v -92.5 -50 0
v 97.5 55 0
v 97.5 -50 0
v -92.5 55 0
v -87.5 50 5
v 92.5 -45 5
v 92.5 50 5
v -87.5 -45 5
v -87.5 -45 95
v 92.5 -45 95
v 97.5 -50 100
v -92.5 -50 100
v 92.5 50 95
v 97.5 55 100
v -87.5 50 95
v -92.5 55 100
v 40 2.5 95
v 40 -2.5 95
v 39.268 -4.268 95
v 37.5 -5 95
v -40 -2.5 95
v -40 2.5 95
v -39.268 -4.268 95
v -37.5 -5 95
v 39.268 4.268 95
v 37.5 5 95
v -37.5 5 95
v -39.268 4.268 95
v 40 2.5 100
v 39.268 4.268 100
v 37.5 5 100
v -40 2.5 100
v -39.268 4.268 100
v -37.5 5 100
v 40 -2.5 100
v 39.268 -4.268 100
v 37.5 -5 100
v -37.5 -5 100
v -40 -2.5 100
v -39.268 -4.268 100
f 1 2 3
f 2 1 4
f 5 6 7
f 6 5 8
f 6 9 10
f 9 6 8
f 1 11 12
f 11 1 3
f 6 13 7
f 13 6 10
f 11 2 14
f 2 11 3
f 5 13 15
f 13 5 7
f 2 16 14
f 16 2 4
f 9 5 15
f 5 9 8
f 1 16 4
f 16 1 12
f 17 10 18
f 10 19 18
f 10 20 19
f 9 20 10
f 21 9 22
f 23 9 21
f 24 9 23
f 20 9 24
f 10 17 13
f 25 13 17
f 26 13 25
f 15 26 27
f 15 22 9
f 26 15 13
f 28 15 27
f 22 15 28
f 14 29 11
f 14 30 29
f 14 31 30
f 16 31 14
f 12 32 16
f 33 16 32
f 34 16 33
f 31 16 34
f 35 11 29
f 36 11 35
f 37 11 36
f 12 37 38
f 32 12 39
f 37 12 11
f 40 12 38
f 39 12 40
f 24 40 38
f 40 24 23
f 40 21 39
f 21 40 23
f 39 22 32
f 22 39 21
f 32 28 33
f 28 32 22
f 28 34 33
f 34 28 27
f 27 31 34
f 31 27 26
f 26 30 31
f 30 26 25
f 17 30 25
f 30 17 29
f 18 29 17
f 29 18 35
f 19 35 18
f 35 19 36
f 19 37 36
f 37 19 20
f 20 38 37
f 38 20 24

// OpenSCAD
Hauteur                         = 100;
Largeur                         = 185;
Profondeur                      = 100;
EpaisseurPlanches               = 5;

NombreSubdivisionsHauteur       = 5;
NombreSubdivisionsLargeur       = 2;
NombreSubdivisionsProfondeur    = 2;

BoiteFermee                     = "oui";//[oui,non]


Fente                           = "oui";//[oui,non]
HauteurFente                    = 10;
LargeurFente                    = 80;
ArrondiCoins                    = 5;

modevision                      = "boite";//[boite,DXF]

SubH = Hauteur/((2*NombreSubdivisionsHauteur)+1);
SubL = (Largeur)/((2*NombreSubdivisionsLargeur)+1);
SubP = Profondeur/((2*NombreSubdivisionsProfondeur)+1);
SubP2 = (Profondeur-EpaisseurPlanches)/((2*NombreSubdivisionsProfondeur)+1);


objet();

module objet()
{
if(modevision=="boite")
{
    boite();
}
if(modevision=="DXF")
{
    DXFF();
}
}
module DXFF()
{
translate([-Largeur/2-EpaisseurPlanches,-Hauteur/2-EpaisseurPlanches])cotesun();
translate([Profondeur/2+EpaisseurPlanches,-Hauteur/2-EpaisseurPlanches])cotesdeux();   
translate([-Largeur/2-EpaisseurPlanches,Hauteur/2+EpaisseurPlanches])cotesun();
translate([Profondeur/2+EpaisseurPlanches,Hauteur/2+EpaisseurPlanches])cotesdeux();
translate([EpaisseurPlanches+Largeur/2,Hauteur+Profondeur/2+EpaisseurPlanches*2]) dessous();
if(BoiteFermee=="oui")
{
translate([-Largeur/2-EpaisseurPlanches,Hauteur+Profondeur/2+EpaisseurPlanches*2]) dessus();  
}
}

module boite()
{
color("red")
linear_extrude(height=EpaisseurPlanches)
dessous();
if(BoiteFermee=="oui")
{
color([1,0,0,1])
translate([0,0,Hauteur-EpaisseurPlanches])
linear_extrude(height=EpaisseurPlanches)
dessus();
}


color("green")
rotate([90,0,0])
translate([0,Hauteur/2,Profondeur/2])
rotate([180,0,0])
linear_extrude(height=EpaisseurPlanches)
cotesun();

color("green")
rotate([90,0,0])
translate([EpaisseurPlanches,Hauteur/2,-Profondeur/2-EpaisseurPlanches])
rotate([0,0,180])
linear_extrude(height=EpaisseurPlanches)
cotesun();

color("blue")
rotate([90,0,90])
translate([0,Hauteur/2,Largeur/2])
linear_extrude(height=EpaisseurPlanches)
cotesdeux();

color("blue")
rotate([90,0,-90])
translate([-EpaisseurPlanches,Hauteur/2,Largeur/2-EpaisseurPlanches])
linear_extrude(height=EpaisseurPlanches)
cotesdeux();
}

module cotesun()
{
    difference()
    {
        union()
        {
            square([Largeur,Hauteur],center=true);
            for(i=[-NombreSubdivisionsHauteur:2:NombreSubdivisionsHauteur])
            {
                translate([Largeur/2,SubH*i,0])
                square([EpaisseurPlanches*2,SubH],center=true);
            }
        }
        for(i=[-NombreSubdivisionsHauteur:2:NombreSubdivisionsHauteur])
        {
            translate([-Largeur/2,SubH*i,0])
            square([EpaisseurPlanches*2,SubH],center=true);
        }
        
        for(i=[-NombreSubdivisionsLargeur+1:2:NombreSubdivisionsLargeur-1])
        {
            translate([EpaisseurPlanches/2,0])
            translate([(((Largeur-1*EpaisseurPlanches)/((2*NombreSubdivisionsLargeur)+1))*i),Hauteur/2])
            square([(Largeur-1*EpaisseurPlanches)/((2*NombreSubdivisionsLargeur)+1),EpaisseurPlanches*2],center=true);
        }
if(BoiteFermee=="oui")
    
        for(i=[-NombreSubdivisionsLargeur+1:2:NombreSubdivisionsLargeur-1])
        {
            translate([EpaisseurPlanches/2,0])
            translate([(((Largeur-1*EpaisseurPlanches)/((2*NombreSubdivisionsLargeur)+1))*i),-Hauteur/2])
            square([(Largeur-1*EpaisseurPlanches)/((2*NombreSubdivisionsLargeur)+1),EpaisseurPlanches*2],center=true);
        }

    }
}






module cotesdeux()
{
difference()
    {
    union()
    {
        square([Profondeur,Hauteur],center=true);
        for(i=[-NombreSubdivisionsHauteur:2:NombreSubdivisionsHauteur])
        {
            translate([Profondeur/2,SubH*i,0])
            square([EpaisseurPlanches*2,SubH],center=true);
        }
 
    }
    for(i=[-NombreSubdivisionsHauteur:2:NombreSubdivisionsHauteur])
    {
        translate([-Profondeur/2,SubH*i,0])
        square([EpaisseurPlanches*2,SubH],center=true);
    }
    for(i=[-NombreSubdivisionsProfondeur+1:2:NombreSubdivisionsProfondeur-1])
    {
        translate([EpaisseurPlanches/2,0])
        translate([(((Profondeur-1*EpaisseurPlanches)/((2*NombreSubdivisionsProfondeur)+1))*i),-Hauteur/2])
        square([(Profondeur-1*EpaisseurPlanches)/((2*NombreSubdivisionsProfondeur)+1),EpaisseurPlanches*2],center=true);
    }
    if(BoiteFermee=="oui")
    {
    for(i=[-NombreSubdivisionsProfondeur+1:2:NombreSubdivisionsProfondeur-1])
    {
        translate([EpaisseurPlanches/2,0])
        translate([(((Profondeur-1*EpaisseurPlanches)/((2*NombreSubdivisionsProfondeur)+1))*i),Hauteur/2])
        square([(Profondeur-1*EpaisseurPlanches)/((2*NombreSubdivisionsProfondeur)+1),EpaisseurPlanches*2],center=true);
    }
}
    
    }
}







module dessous()
{
    tailleX=Largeur-(EpaisseurPlanches);
    tailleY=Profondeur-(EpaisseurPlanches);
    union()
    {
        translate([EpaisseurPlanches/2,EpaisseurPlanches/2])
        square([tailleX,tailleY],center=true);
        for(i=[-NombreSubdivisionsLargeur+1:2:NombreSubdivisionsLargeur-1])
        {
            translate([EpaisseurPlanches/2,0])
            translate([(((Largeur-1*EpaisseurPlanches)/((2*NombreSubdivisionsLargeur)+1))*i),-Profondeur/2+EpaisseurPlanches])
            square([(Largeur-1*EpaisseurPlanches)/((2*NombreSubdivisionsLargeur)+1),EpaisseurPlanches*2],center=true);
        }
        for(i=[-NombreSubdivisionsLargeur+1:2:NombreSubdivisionsLargeur-1])
        {
            translate([EpaisseurPlanches/2,0])
            translate([(((Largeur-1*EpaisseurPlanches)/((2*NombreSubdivisionsLargeur)+1))*i),Profondeur/2])
            square([(Largeur-1*EpaisseurPlanches)/((2*NombreSubdivisionsLargeur)+1),EpaisseurPlanches*2],center=true);
        }
        for(i=[-NombreSubdivisionsProfondeur+1:2:NombreSubdivisionsProfondeur-1])
        {
            translate([Largeur/2,EpaisseurPlanches/2])
            translate([0,i*SubP2])
            square([EpaisseurPlanches*2,SubP2],center=true);
        }
        for(i=[-NombreSubdivisionsProfondeur+1:2:NombreSubdivisionsProfondeur-1])
        {
            translate([-Largeur/2+EpaisseurPlanches,EpaisseurPlanches/2])
            translate([0,i*SubP2])
            square([EpaisseurPlanches*2,SubP2],center=true);
        }
    }
}


module dessus()
{
    tailleX=Largeur-(EpaisseurPlanches);
    tailleY=Profondeur-(EpaisseurPlanches);
    difference()
    {
        union()
        {
            translate([EpaisseurPlanches/2,EpaisseurPlanches/2])
            square([tailleX,tailleY],center=true);
            for(i=[-NombreSubdivisionsLargeur+1:2:NombreSubdivisionsLargeur-1])
            {
                translate([EpaisseurPlanches/2,0])
                translate([(((Largeur-1*EpaisseurPlanches)/((2*NombreSubdivisionsLargeur)+1))*i),-Profondeur/2+EpaisseurPlanches])
                square([(Largeur-1*EpaisseurPlanches)/((2*NombreSubdivisionsLargeur)+1),EpaisseurPlanches*2],center=true);
            }
            for(i=[-NombreSubdivisionsLargeur+1:2:NombreSubdivisionsLargeur-1])
            {
                translate([EpaisseurPlanches/2,0])
                translate([(((Largeur-1*EpaisseurPlanches)/((2*NombreSubdivisionsLargeur)+1))*i),Profondeur/2])
                square([(Largeur-1*EpaisseurPlanches)/((2*NombreSubdivisionsLargeur)+1),EpaisseurPlanches*2],center=true);
            }
            for(i=[-NombreSubdivisionsProfondeur+1:2:NombreSubdivisionsProfondeur-1])
            {
                translate([Largeur/2,EpaisseurPlanches/2])
                translate([0,i*SubP2])
                square([EpaisseurPlanches*2,SubP2],center=true);
            }
            for(i=[-NombreSubdivisionsProfondeur+1:2:NombreSubdivisionsProfondeur-1])
            {
                translate([-Largeur/2+EpaisseurPlanches,EpaisseurPlanches/2])
                translate([0,i*SubP2])
                square([EpaisseurPlanches*2,SubP2],center=true);
            }
        }
        if(Fente=="oui")
        {
        hull()
        {
            translate([LargeurFente/2-ArrondiCoins/2,HauteurFente/2-ArrondiCoins/2])
            circle(r=ArrondiCoins/2);
    
            translate([LargeurFente/2-ArrondiCoins/2,-HauteurFente/2+ArrondiCoins/2])
            circle(r=ArrondiCoins/2);
    
            translate([-LargeurFente/2+ArrondiCoins/2,HauteurFente/2-ArrondiCoins/2])
            circle(r=ArrondiCoins/2);
    
            translate([-LargeurFente/2+ArrondiCoins/2,-HauteurFente/2+ArrondiCoins/2])
            circle(r=ArrondiCoins/2);
        }
    }
        
        
    }
}
